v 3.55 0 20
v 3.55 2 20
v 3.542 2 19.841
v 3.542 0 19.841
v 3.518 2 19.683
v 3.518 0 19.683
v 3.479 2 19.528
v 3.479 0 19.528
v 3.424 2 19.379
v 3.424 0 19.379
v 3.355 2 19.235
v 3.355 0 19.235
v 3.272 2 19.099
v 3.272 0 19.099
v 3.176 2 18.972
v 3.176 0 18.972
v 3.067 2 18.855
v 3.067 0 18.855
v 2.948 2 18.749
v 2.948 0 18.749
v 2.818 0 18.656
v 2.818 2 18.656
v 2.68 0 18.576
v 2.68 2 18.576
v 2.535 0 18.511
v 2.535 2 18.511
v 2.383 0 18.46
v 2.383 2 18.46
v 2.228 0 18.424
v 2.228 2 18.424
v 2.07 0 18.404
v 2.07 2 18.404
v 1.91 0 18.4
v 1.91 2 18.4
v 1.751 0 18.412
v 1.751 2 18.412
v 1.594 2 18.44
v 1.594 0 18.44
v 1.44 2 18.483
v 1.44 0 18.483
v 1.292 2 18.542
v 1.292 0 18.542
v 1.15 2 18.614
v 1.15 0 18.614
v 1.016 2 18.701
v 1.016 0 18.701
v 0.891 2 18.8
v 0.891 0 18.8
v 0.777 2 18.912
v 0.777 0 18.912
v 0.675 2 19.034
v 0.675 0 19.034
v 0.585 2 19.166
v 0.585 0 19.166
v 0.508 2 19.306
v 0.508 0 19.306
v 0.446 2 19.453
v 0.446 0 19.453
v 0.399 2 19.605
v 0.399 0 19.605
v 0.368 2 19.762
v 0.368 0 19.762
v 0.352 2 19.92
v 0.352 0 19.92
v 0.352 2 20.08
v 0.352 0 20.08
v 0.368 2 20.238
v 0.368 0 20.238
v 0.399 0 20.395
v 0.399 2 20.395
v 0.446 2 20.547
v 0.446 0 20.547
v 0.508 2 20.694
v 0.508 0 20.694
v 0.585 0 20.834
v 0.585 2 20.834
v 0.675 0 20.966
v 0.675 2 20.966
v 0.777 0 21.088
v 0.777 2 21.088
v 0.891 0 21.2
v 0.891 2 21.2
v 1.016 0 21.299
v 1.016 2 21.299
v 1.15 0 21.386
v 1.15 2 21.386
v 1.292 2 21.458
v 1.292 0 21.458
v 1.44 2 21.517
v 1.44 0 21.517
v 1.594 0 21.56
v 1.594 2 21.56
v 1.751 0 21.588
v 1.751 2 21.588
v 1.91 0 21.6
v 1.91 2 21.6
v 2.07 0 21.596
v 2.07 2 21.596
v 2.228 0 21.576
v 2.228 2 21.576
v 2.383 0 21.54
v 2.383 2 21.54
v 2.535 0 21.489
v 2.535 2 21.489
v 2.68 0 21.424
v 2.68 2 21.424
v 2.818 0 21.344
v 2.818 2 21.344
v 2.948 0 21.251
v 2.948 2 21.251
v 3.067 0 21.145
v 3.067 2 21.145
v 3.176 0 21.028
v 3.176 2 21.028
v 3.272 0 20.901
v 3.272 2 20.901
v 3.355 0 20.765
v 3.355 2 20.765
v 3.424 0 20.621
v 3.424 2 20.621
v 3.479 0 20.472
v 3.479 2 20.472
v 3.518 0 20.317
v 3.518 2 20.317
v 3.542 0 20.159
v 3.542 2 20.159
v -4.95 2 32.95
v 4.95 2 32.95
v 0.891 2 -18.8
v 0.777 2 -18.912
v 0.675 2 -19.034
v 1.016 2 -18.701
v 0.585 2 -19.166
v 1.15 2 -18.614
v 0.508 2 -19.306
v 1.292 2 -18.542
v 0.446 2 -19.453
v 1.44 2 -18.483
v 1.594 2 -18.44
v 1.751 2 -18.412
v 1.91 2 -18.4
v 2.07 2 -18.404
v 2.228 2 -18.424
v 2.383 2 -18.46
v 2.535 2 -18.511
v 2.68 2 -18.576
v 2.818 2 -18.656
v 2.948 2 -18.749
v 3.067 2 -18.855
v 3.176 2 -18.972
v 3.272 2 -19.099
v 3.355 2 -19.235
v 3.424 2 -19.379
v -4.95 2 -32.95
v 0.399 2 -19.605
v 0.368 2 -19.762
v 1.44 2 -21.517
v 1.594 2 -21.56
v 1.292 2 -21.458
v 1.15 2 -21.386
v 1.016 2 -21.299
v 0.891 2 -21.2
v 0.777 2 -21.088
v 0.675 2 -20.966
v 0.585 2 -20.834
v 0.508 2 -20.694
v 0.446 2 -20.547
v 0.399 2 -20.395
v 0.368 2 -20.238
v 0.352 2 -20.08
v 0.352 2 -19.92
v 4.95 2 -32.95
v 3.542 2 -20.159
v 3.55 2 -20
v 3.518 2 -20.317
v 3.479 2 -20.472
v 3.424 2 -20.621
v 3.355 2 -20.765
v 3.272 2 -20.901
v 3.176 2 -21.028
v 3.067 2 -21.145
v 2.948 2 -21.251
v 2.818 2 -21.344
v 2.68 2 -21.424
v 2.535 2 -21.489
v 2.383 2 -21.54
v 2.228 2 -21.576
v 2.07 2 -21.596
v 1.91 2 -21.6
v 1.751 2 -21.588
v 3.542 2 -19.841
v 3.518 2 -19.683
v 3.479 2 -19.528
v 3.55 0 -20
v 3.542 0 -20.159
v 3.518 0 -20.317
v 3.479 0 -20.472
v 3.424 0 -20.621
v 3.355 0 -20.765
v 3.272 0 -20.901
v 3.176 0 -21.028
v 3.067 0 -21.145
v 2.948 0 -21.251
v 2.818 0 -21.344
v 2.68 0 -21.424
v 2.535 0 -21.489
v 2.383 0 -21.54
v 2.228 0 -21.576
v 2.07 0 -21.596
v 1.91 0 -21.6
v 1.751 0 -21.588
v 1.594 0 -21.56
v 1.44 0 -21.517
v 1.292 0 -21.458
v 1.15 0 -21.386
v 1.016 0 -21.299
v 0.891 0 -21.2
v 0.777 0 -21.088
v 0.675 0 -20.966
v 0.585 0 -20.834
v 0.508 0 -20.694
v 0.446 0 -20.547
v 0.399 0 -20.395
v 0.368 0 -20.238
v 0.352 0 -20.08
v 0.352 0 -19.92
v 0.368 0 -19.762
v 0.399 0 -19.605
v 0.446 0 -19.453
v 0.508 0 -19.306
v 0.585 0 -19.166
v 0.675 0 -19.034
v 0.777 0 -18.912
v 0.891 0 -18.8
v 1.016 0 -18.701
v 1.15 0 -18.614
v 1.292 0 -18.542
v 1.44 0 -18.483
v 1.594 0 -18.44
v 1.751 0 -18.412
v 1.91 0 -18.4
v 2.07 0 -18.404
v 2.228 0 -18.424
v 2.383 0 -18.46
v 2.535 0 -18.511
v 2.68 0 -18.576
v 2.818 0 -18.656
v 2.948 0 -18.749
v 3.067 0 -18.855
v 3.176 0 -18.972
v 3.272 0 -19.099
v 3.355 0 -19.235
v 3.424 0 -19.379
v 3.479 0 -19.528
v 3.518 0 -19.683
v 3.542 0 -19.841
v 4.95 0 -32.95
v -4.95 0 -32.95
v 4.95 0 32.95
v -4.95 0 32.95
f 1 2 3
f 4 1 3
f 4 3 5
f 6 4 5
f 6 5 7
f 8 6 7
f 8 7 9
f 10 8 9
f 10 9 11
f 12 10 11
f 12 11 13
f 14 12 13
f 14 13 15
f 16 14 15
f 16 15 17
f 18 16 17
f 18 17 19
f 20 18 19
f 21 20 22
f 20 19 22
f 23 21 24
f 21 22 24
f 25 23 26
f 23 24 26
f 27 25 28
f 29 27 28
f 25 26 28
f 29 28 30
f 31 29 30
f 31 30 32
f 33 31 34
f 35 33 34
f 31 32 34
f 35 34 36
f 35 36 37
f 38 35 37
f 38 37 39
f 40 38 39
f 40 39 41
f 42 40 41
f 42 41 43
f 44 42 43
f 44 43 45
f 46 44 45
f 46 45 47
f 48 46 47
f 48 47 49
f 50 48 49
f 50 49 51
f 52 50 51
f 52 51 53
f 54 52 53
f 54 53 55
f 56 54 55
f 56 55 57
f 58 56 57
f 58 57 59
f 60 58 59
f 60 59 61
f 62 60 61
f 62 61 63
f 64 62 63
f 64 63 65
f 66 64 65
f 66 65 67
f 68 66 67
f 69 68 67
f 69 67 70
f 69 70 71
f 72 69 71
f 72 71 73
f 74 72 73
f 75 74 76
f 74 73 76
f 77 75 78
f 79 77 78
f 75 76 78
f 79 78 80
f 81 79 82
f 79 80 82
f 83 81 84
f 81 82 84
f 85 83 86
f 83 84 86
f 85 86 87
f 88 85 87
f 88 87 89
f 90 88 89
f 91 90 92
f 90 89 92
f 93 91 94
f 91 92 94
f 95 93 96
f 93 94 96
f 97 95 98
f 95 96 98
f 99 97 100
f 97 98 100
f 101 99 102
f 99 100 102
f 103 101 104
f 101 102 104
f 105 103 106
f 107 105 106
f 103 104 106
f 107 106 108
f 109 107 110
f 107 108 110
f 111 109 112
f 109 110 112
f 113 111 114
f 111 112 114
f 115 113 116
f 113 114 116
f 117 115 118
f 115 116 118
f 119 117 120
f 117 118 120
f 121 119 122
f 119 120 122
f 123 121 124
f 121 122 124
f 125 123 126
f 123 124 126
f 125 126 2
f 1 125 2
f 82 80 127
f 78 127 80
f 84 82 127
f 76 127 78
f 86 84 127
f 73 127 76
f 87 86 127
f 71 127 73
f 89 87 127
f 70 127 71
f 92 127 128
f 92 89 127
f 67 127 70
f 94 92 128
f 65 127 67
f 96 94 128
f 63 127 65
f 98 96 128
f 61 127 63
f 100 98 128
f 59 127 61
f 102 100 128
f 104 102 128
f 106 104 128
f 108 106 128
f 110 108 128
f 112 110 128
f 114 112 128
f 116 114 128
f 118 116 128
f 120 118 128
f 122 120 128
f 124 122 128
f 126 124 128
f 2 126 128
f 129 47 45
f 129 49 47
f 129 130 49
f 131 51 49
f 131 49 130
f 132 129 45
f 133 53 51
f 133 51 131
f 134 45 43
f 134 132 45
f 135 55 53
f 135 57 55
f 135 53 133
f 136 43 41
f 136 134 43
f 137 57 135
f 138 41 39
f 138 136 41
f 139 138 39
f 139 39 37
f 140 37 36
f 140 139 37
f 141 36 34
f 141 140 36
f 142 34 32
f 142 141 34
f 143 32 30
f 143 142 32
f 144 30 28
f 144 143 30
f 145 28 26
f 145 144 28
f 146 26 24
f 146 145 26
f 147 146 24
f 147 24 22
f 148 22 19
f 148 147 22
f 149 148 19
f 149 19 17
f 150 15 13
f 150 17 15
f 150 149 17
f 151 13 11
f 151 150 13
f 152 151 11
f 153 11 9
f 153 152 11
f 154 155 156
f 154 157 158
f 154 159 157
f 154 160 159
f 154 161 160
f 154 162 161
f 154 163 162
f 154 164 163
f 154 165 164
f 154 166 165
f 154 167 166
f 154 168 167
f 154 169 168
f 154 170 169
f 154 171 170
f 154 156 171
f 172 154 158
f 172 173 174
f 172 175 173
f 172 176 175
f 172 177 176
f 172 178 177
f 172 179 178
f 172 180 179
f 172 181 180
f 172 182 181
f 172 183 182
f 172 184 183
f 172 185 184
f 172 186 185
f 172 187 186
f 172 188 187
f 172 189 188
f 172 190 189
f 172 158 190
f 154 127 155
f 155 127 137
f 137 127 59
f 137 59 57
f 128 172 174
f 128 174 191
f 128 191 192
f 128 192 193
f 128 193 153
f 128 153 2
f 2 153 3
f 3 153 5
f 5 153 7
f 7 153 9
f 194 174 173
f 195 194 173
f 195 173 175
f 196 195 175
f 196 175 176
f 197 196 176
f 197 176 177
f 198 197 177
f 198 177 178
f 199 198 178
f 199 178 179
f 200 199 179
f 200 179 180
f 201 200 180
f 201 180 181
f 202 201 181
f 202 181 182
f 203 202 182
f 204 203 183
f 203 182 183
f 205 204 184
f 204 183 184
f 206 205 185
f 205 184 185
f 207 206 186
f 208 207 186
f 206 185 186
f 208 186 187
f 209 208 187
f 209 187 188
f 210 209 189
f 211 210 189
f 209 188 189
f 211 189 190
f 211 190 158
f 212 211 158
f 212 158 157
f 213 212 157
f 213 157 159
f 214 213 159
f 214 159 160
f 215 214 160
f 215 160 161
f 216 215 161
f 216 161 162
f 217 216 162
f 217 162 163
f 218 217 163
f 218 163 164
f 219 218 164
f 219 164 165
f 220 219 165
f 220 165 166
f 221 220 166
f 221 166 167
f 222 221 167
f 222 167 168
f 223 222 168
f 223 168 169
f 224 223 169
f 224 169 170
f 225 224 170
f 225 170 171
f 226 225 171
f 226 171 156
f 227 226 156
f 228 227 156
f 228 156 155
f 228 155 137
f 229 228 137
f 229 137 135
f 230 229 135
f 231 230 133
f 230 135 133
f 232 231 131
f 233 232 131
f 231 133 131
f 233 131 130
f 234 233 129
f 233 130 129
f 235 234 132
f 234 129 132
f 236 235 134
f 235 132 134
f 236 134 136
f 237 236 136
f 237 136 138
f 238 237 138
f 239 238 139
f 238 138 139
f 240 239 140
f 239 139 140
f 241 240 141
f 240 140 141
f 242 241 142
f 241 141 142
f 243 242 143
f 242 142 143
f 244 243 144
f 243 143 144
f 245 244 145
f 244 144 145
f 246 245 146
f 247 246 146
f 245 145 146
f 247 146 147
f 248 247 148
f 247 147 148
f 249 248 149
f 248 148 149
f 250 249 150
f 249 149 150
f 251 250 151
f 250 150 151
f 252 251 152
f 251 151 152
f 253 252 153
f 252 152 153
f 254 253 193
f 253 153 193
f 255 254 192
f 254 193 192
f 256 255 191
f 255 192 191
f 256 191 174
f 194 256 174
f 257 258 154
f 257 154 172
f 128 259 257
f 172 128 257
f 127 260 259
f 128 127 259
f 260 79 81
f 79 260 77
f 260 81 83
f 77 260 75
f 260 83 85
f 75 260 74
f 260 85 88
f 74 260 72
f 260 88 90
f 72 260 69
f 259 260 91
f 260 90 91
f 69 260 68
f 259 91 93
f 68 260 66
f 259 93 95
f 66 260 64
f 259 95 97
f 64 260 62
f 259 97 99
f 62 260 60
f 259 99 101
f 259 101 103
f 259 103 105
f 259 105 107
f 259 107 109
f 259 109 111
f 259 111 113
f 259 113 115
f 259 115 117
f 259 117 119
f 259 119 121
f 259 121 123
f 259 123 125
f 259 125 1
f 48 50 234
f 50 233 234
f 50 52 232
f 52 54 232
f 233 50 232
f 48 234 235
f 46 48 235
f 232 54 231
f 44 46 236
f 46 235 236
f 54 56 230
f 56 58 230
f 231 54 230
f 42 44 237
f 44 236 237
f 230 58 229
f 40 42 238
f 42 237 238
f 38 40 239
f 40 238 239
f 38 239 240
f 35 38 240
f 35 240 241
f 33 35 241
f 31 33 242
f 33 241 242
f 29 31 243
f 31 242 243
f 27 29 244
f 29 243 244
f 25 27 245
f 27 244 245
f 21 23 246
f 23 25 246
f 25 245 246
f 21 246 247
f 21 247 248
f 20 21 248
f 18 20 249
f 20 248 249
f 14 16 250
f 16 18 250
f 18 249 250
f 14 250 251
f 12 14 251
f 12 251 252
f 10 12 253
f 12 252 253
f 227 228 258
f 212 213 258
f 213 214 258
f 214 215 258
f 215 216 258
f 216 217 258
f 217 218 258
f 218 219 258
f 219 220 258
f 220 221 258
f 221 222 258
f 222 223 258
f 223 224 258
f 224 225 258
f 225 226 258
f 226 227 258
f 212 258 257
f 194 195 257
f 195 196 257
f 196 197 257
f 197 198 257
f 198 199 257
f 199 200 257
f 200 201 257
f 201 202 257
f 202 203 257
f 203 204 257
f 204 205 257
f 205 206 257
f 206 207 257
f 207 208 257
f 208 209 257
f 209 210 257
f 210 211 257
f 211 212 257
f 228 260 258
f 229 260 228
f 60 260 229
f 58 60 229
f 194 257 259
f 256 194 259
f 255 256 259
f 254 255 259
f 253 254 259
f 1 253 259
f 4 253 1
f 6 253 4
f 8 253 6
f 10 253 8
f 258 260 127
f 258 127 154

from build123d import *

# Parameters (mm, degrees)
SKETCH_1_W               = 9.9
SKETCH_1_H               = 65.9
EXTRUDE_1_DEPTH          = 2
SKETCH_2_R               = 1.6
CUT_EXTRUDE_1_DEPTH      = 1
CUT_EXTRUDE_1_DEPTH_BACK = 3


with BuildPart() as part:
    # Эскиз1 → Бобышка-Вытянуть1 (new body)
    with BuildSketch(Plane(origin=(0, 0, 0), x_dir=(1, 0, 0), z_dir=(0, 1, 0))):
        Rectangle(SKETCH_1_W, SKETCH_1_H)
    extrude(amount=EXTRUDE_1_DEPTH)

    # Эскиз2 → Вырез-Вытянуть1 (cut, two sides)
    with BuildSketch(Plane(origin=(0, 2, 0), x_dir=(1, 0, 0), z_dir=(0, 1, 0))) as cut_extrude_1_sk:
        with Locations((1.95, 20)):
            Circle(SKETCH_2_R)
        with Locations((1.95, -20)):
            Circle(SKETCH_2_R)
    extrude(amount=CUT_EXTRUDE_1_DEPTH, mode=Mode.SUBTRACT)
    extrude(cut_extrude_1_sk.sketch, amount=-CUT_EXTRUDE_1_DEPTH_BACK, mode=Mode.SUBTRACT)


solid = part.part
